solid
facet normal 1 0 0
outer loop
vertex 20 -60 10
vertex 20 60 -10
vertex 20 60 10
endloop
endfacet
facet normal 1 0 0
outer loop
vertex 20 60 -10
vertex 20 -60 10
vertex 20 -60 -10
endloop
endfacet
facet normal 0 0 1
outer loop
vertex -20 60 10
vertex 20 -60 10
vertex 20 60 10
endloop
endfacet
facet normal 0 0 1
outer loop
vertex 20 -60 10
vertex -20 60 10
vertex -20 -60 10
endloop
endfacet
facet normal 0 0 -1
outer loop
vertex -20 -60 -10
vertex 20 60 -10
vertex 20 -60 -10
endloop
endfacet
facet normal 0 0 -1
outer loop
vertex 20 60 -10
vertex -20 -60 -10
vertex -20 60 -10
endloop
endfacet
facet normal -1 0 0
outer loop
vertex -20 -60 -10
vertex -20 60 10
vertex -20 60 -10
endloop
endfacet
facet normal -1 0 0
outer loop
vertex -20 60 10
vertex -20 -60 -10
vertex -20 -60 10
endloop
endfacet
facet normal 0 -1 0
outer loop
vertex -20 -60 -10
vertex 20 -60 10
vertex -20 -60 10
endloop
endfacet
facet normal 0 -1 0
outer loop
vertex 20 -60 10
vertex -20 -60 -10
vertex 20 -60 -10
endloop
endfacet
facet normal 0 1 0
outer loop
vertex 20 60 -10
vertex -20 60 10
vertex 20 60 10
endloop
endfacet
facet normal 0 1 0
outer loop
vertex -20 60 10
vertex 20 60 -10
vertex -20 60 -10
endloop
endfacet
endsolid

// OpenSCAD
// Two PLA blocks butted at y = 0, joined by a steel bar bonded in a slot cut in both.
// The far end of the right block is clamped, the far end of the left one is pulled sideways:
// the bar carries the bending.

//@sim contact left right mode=frictionless
module bar() translate([-4, -30, -4]) cube([8, 60, 8]);

//@sim material=pla
module left() difference() {
    translate([-20, -60, -10]) cube([40, 60, 20]);
    bar();
}

//@sim material=pla
module right() difference() {
    translate([-20, 0, -10]) cube([40, 60, 20]);
    bar();
}

//@sim material=steel h=3
module steel_bar() bar();

//@sim fixed
module clamp() translate([-21, 59, -11]) cube([42, 2, 22]);

//@sim load force=[200,0,0]
module pull() translate([-21, -61, -11]) cube([42, 2, 22]);

left();
right();
steel_bar();
